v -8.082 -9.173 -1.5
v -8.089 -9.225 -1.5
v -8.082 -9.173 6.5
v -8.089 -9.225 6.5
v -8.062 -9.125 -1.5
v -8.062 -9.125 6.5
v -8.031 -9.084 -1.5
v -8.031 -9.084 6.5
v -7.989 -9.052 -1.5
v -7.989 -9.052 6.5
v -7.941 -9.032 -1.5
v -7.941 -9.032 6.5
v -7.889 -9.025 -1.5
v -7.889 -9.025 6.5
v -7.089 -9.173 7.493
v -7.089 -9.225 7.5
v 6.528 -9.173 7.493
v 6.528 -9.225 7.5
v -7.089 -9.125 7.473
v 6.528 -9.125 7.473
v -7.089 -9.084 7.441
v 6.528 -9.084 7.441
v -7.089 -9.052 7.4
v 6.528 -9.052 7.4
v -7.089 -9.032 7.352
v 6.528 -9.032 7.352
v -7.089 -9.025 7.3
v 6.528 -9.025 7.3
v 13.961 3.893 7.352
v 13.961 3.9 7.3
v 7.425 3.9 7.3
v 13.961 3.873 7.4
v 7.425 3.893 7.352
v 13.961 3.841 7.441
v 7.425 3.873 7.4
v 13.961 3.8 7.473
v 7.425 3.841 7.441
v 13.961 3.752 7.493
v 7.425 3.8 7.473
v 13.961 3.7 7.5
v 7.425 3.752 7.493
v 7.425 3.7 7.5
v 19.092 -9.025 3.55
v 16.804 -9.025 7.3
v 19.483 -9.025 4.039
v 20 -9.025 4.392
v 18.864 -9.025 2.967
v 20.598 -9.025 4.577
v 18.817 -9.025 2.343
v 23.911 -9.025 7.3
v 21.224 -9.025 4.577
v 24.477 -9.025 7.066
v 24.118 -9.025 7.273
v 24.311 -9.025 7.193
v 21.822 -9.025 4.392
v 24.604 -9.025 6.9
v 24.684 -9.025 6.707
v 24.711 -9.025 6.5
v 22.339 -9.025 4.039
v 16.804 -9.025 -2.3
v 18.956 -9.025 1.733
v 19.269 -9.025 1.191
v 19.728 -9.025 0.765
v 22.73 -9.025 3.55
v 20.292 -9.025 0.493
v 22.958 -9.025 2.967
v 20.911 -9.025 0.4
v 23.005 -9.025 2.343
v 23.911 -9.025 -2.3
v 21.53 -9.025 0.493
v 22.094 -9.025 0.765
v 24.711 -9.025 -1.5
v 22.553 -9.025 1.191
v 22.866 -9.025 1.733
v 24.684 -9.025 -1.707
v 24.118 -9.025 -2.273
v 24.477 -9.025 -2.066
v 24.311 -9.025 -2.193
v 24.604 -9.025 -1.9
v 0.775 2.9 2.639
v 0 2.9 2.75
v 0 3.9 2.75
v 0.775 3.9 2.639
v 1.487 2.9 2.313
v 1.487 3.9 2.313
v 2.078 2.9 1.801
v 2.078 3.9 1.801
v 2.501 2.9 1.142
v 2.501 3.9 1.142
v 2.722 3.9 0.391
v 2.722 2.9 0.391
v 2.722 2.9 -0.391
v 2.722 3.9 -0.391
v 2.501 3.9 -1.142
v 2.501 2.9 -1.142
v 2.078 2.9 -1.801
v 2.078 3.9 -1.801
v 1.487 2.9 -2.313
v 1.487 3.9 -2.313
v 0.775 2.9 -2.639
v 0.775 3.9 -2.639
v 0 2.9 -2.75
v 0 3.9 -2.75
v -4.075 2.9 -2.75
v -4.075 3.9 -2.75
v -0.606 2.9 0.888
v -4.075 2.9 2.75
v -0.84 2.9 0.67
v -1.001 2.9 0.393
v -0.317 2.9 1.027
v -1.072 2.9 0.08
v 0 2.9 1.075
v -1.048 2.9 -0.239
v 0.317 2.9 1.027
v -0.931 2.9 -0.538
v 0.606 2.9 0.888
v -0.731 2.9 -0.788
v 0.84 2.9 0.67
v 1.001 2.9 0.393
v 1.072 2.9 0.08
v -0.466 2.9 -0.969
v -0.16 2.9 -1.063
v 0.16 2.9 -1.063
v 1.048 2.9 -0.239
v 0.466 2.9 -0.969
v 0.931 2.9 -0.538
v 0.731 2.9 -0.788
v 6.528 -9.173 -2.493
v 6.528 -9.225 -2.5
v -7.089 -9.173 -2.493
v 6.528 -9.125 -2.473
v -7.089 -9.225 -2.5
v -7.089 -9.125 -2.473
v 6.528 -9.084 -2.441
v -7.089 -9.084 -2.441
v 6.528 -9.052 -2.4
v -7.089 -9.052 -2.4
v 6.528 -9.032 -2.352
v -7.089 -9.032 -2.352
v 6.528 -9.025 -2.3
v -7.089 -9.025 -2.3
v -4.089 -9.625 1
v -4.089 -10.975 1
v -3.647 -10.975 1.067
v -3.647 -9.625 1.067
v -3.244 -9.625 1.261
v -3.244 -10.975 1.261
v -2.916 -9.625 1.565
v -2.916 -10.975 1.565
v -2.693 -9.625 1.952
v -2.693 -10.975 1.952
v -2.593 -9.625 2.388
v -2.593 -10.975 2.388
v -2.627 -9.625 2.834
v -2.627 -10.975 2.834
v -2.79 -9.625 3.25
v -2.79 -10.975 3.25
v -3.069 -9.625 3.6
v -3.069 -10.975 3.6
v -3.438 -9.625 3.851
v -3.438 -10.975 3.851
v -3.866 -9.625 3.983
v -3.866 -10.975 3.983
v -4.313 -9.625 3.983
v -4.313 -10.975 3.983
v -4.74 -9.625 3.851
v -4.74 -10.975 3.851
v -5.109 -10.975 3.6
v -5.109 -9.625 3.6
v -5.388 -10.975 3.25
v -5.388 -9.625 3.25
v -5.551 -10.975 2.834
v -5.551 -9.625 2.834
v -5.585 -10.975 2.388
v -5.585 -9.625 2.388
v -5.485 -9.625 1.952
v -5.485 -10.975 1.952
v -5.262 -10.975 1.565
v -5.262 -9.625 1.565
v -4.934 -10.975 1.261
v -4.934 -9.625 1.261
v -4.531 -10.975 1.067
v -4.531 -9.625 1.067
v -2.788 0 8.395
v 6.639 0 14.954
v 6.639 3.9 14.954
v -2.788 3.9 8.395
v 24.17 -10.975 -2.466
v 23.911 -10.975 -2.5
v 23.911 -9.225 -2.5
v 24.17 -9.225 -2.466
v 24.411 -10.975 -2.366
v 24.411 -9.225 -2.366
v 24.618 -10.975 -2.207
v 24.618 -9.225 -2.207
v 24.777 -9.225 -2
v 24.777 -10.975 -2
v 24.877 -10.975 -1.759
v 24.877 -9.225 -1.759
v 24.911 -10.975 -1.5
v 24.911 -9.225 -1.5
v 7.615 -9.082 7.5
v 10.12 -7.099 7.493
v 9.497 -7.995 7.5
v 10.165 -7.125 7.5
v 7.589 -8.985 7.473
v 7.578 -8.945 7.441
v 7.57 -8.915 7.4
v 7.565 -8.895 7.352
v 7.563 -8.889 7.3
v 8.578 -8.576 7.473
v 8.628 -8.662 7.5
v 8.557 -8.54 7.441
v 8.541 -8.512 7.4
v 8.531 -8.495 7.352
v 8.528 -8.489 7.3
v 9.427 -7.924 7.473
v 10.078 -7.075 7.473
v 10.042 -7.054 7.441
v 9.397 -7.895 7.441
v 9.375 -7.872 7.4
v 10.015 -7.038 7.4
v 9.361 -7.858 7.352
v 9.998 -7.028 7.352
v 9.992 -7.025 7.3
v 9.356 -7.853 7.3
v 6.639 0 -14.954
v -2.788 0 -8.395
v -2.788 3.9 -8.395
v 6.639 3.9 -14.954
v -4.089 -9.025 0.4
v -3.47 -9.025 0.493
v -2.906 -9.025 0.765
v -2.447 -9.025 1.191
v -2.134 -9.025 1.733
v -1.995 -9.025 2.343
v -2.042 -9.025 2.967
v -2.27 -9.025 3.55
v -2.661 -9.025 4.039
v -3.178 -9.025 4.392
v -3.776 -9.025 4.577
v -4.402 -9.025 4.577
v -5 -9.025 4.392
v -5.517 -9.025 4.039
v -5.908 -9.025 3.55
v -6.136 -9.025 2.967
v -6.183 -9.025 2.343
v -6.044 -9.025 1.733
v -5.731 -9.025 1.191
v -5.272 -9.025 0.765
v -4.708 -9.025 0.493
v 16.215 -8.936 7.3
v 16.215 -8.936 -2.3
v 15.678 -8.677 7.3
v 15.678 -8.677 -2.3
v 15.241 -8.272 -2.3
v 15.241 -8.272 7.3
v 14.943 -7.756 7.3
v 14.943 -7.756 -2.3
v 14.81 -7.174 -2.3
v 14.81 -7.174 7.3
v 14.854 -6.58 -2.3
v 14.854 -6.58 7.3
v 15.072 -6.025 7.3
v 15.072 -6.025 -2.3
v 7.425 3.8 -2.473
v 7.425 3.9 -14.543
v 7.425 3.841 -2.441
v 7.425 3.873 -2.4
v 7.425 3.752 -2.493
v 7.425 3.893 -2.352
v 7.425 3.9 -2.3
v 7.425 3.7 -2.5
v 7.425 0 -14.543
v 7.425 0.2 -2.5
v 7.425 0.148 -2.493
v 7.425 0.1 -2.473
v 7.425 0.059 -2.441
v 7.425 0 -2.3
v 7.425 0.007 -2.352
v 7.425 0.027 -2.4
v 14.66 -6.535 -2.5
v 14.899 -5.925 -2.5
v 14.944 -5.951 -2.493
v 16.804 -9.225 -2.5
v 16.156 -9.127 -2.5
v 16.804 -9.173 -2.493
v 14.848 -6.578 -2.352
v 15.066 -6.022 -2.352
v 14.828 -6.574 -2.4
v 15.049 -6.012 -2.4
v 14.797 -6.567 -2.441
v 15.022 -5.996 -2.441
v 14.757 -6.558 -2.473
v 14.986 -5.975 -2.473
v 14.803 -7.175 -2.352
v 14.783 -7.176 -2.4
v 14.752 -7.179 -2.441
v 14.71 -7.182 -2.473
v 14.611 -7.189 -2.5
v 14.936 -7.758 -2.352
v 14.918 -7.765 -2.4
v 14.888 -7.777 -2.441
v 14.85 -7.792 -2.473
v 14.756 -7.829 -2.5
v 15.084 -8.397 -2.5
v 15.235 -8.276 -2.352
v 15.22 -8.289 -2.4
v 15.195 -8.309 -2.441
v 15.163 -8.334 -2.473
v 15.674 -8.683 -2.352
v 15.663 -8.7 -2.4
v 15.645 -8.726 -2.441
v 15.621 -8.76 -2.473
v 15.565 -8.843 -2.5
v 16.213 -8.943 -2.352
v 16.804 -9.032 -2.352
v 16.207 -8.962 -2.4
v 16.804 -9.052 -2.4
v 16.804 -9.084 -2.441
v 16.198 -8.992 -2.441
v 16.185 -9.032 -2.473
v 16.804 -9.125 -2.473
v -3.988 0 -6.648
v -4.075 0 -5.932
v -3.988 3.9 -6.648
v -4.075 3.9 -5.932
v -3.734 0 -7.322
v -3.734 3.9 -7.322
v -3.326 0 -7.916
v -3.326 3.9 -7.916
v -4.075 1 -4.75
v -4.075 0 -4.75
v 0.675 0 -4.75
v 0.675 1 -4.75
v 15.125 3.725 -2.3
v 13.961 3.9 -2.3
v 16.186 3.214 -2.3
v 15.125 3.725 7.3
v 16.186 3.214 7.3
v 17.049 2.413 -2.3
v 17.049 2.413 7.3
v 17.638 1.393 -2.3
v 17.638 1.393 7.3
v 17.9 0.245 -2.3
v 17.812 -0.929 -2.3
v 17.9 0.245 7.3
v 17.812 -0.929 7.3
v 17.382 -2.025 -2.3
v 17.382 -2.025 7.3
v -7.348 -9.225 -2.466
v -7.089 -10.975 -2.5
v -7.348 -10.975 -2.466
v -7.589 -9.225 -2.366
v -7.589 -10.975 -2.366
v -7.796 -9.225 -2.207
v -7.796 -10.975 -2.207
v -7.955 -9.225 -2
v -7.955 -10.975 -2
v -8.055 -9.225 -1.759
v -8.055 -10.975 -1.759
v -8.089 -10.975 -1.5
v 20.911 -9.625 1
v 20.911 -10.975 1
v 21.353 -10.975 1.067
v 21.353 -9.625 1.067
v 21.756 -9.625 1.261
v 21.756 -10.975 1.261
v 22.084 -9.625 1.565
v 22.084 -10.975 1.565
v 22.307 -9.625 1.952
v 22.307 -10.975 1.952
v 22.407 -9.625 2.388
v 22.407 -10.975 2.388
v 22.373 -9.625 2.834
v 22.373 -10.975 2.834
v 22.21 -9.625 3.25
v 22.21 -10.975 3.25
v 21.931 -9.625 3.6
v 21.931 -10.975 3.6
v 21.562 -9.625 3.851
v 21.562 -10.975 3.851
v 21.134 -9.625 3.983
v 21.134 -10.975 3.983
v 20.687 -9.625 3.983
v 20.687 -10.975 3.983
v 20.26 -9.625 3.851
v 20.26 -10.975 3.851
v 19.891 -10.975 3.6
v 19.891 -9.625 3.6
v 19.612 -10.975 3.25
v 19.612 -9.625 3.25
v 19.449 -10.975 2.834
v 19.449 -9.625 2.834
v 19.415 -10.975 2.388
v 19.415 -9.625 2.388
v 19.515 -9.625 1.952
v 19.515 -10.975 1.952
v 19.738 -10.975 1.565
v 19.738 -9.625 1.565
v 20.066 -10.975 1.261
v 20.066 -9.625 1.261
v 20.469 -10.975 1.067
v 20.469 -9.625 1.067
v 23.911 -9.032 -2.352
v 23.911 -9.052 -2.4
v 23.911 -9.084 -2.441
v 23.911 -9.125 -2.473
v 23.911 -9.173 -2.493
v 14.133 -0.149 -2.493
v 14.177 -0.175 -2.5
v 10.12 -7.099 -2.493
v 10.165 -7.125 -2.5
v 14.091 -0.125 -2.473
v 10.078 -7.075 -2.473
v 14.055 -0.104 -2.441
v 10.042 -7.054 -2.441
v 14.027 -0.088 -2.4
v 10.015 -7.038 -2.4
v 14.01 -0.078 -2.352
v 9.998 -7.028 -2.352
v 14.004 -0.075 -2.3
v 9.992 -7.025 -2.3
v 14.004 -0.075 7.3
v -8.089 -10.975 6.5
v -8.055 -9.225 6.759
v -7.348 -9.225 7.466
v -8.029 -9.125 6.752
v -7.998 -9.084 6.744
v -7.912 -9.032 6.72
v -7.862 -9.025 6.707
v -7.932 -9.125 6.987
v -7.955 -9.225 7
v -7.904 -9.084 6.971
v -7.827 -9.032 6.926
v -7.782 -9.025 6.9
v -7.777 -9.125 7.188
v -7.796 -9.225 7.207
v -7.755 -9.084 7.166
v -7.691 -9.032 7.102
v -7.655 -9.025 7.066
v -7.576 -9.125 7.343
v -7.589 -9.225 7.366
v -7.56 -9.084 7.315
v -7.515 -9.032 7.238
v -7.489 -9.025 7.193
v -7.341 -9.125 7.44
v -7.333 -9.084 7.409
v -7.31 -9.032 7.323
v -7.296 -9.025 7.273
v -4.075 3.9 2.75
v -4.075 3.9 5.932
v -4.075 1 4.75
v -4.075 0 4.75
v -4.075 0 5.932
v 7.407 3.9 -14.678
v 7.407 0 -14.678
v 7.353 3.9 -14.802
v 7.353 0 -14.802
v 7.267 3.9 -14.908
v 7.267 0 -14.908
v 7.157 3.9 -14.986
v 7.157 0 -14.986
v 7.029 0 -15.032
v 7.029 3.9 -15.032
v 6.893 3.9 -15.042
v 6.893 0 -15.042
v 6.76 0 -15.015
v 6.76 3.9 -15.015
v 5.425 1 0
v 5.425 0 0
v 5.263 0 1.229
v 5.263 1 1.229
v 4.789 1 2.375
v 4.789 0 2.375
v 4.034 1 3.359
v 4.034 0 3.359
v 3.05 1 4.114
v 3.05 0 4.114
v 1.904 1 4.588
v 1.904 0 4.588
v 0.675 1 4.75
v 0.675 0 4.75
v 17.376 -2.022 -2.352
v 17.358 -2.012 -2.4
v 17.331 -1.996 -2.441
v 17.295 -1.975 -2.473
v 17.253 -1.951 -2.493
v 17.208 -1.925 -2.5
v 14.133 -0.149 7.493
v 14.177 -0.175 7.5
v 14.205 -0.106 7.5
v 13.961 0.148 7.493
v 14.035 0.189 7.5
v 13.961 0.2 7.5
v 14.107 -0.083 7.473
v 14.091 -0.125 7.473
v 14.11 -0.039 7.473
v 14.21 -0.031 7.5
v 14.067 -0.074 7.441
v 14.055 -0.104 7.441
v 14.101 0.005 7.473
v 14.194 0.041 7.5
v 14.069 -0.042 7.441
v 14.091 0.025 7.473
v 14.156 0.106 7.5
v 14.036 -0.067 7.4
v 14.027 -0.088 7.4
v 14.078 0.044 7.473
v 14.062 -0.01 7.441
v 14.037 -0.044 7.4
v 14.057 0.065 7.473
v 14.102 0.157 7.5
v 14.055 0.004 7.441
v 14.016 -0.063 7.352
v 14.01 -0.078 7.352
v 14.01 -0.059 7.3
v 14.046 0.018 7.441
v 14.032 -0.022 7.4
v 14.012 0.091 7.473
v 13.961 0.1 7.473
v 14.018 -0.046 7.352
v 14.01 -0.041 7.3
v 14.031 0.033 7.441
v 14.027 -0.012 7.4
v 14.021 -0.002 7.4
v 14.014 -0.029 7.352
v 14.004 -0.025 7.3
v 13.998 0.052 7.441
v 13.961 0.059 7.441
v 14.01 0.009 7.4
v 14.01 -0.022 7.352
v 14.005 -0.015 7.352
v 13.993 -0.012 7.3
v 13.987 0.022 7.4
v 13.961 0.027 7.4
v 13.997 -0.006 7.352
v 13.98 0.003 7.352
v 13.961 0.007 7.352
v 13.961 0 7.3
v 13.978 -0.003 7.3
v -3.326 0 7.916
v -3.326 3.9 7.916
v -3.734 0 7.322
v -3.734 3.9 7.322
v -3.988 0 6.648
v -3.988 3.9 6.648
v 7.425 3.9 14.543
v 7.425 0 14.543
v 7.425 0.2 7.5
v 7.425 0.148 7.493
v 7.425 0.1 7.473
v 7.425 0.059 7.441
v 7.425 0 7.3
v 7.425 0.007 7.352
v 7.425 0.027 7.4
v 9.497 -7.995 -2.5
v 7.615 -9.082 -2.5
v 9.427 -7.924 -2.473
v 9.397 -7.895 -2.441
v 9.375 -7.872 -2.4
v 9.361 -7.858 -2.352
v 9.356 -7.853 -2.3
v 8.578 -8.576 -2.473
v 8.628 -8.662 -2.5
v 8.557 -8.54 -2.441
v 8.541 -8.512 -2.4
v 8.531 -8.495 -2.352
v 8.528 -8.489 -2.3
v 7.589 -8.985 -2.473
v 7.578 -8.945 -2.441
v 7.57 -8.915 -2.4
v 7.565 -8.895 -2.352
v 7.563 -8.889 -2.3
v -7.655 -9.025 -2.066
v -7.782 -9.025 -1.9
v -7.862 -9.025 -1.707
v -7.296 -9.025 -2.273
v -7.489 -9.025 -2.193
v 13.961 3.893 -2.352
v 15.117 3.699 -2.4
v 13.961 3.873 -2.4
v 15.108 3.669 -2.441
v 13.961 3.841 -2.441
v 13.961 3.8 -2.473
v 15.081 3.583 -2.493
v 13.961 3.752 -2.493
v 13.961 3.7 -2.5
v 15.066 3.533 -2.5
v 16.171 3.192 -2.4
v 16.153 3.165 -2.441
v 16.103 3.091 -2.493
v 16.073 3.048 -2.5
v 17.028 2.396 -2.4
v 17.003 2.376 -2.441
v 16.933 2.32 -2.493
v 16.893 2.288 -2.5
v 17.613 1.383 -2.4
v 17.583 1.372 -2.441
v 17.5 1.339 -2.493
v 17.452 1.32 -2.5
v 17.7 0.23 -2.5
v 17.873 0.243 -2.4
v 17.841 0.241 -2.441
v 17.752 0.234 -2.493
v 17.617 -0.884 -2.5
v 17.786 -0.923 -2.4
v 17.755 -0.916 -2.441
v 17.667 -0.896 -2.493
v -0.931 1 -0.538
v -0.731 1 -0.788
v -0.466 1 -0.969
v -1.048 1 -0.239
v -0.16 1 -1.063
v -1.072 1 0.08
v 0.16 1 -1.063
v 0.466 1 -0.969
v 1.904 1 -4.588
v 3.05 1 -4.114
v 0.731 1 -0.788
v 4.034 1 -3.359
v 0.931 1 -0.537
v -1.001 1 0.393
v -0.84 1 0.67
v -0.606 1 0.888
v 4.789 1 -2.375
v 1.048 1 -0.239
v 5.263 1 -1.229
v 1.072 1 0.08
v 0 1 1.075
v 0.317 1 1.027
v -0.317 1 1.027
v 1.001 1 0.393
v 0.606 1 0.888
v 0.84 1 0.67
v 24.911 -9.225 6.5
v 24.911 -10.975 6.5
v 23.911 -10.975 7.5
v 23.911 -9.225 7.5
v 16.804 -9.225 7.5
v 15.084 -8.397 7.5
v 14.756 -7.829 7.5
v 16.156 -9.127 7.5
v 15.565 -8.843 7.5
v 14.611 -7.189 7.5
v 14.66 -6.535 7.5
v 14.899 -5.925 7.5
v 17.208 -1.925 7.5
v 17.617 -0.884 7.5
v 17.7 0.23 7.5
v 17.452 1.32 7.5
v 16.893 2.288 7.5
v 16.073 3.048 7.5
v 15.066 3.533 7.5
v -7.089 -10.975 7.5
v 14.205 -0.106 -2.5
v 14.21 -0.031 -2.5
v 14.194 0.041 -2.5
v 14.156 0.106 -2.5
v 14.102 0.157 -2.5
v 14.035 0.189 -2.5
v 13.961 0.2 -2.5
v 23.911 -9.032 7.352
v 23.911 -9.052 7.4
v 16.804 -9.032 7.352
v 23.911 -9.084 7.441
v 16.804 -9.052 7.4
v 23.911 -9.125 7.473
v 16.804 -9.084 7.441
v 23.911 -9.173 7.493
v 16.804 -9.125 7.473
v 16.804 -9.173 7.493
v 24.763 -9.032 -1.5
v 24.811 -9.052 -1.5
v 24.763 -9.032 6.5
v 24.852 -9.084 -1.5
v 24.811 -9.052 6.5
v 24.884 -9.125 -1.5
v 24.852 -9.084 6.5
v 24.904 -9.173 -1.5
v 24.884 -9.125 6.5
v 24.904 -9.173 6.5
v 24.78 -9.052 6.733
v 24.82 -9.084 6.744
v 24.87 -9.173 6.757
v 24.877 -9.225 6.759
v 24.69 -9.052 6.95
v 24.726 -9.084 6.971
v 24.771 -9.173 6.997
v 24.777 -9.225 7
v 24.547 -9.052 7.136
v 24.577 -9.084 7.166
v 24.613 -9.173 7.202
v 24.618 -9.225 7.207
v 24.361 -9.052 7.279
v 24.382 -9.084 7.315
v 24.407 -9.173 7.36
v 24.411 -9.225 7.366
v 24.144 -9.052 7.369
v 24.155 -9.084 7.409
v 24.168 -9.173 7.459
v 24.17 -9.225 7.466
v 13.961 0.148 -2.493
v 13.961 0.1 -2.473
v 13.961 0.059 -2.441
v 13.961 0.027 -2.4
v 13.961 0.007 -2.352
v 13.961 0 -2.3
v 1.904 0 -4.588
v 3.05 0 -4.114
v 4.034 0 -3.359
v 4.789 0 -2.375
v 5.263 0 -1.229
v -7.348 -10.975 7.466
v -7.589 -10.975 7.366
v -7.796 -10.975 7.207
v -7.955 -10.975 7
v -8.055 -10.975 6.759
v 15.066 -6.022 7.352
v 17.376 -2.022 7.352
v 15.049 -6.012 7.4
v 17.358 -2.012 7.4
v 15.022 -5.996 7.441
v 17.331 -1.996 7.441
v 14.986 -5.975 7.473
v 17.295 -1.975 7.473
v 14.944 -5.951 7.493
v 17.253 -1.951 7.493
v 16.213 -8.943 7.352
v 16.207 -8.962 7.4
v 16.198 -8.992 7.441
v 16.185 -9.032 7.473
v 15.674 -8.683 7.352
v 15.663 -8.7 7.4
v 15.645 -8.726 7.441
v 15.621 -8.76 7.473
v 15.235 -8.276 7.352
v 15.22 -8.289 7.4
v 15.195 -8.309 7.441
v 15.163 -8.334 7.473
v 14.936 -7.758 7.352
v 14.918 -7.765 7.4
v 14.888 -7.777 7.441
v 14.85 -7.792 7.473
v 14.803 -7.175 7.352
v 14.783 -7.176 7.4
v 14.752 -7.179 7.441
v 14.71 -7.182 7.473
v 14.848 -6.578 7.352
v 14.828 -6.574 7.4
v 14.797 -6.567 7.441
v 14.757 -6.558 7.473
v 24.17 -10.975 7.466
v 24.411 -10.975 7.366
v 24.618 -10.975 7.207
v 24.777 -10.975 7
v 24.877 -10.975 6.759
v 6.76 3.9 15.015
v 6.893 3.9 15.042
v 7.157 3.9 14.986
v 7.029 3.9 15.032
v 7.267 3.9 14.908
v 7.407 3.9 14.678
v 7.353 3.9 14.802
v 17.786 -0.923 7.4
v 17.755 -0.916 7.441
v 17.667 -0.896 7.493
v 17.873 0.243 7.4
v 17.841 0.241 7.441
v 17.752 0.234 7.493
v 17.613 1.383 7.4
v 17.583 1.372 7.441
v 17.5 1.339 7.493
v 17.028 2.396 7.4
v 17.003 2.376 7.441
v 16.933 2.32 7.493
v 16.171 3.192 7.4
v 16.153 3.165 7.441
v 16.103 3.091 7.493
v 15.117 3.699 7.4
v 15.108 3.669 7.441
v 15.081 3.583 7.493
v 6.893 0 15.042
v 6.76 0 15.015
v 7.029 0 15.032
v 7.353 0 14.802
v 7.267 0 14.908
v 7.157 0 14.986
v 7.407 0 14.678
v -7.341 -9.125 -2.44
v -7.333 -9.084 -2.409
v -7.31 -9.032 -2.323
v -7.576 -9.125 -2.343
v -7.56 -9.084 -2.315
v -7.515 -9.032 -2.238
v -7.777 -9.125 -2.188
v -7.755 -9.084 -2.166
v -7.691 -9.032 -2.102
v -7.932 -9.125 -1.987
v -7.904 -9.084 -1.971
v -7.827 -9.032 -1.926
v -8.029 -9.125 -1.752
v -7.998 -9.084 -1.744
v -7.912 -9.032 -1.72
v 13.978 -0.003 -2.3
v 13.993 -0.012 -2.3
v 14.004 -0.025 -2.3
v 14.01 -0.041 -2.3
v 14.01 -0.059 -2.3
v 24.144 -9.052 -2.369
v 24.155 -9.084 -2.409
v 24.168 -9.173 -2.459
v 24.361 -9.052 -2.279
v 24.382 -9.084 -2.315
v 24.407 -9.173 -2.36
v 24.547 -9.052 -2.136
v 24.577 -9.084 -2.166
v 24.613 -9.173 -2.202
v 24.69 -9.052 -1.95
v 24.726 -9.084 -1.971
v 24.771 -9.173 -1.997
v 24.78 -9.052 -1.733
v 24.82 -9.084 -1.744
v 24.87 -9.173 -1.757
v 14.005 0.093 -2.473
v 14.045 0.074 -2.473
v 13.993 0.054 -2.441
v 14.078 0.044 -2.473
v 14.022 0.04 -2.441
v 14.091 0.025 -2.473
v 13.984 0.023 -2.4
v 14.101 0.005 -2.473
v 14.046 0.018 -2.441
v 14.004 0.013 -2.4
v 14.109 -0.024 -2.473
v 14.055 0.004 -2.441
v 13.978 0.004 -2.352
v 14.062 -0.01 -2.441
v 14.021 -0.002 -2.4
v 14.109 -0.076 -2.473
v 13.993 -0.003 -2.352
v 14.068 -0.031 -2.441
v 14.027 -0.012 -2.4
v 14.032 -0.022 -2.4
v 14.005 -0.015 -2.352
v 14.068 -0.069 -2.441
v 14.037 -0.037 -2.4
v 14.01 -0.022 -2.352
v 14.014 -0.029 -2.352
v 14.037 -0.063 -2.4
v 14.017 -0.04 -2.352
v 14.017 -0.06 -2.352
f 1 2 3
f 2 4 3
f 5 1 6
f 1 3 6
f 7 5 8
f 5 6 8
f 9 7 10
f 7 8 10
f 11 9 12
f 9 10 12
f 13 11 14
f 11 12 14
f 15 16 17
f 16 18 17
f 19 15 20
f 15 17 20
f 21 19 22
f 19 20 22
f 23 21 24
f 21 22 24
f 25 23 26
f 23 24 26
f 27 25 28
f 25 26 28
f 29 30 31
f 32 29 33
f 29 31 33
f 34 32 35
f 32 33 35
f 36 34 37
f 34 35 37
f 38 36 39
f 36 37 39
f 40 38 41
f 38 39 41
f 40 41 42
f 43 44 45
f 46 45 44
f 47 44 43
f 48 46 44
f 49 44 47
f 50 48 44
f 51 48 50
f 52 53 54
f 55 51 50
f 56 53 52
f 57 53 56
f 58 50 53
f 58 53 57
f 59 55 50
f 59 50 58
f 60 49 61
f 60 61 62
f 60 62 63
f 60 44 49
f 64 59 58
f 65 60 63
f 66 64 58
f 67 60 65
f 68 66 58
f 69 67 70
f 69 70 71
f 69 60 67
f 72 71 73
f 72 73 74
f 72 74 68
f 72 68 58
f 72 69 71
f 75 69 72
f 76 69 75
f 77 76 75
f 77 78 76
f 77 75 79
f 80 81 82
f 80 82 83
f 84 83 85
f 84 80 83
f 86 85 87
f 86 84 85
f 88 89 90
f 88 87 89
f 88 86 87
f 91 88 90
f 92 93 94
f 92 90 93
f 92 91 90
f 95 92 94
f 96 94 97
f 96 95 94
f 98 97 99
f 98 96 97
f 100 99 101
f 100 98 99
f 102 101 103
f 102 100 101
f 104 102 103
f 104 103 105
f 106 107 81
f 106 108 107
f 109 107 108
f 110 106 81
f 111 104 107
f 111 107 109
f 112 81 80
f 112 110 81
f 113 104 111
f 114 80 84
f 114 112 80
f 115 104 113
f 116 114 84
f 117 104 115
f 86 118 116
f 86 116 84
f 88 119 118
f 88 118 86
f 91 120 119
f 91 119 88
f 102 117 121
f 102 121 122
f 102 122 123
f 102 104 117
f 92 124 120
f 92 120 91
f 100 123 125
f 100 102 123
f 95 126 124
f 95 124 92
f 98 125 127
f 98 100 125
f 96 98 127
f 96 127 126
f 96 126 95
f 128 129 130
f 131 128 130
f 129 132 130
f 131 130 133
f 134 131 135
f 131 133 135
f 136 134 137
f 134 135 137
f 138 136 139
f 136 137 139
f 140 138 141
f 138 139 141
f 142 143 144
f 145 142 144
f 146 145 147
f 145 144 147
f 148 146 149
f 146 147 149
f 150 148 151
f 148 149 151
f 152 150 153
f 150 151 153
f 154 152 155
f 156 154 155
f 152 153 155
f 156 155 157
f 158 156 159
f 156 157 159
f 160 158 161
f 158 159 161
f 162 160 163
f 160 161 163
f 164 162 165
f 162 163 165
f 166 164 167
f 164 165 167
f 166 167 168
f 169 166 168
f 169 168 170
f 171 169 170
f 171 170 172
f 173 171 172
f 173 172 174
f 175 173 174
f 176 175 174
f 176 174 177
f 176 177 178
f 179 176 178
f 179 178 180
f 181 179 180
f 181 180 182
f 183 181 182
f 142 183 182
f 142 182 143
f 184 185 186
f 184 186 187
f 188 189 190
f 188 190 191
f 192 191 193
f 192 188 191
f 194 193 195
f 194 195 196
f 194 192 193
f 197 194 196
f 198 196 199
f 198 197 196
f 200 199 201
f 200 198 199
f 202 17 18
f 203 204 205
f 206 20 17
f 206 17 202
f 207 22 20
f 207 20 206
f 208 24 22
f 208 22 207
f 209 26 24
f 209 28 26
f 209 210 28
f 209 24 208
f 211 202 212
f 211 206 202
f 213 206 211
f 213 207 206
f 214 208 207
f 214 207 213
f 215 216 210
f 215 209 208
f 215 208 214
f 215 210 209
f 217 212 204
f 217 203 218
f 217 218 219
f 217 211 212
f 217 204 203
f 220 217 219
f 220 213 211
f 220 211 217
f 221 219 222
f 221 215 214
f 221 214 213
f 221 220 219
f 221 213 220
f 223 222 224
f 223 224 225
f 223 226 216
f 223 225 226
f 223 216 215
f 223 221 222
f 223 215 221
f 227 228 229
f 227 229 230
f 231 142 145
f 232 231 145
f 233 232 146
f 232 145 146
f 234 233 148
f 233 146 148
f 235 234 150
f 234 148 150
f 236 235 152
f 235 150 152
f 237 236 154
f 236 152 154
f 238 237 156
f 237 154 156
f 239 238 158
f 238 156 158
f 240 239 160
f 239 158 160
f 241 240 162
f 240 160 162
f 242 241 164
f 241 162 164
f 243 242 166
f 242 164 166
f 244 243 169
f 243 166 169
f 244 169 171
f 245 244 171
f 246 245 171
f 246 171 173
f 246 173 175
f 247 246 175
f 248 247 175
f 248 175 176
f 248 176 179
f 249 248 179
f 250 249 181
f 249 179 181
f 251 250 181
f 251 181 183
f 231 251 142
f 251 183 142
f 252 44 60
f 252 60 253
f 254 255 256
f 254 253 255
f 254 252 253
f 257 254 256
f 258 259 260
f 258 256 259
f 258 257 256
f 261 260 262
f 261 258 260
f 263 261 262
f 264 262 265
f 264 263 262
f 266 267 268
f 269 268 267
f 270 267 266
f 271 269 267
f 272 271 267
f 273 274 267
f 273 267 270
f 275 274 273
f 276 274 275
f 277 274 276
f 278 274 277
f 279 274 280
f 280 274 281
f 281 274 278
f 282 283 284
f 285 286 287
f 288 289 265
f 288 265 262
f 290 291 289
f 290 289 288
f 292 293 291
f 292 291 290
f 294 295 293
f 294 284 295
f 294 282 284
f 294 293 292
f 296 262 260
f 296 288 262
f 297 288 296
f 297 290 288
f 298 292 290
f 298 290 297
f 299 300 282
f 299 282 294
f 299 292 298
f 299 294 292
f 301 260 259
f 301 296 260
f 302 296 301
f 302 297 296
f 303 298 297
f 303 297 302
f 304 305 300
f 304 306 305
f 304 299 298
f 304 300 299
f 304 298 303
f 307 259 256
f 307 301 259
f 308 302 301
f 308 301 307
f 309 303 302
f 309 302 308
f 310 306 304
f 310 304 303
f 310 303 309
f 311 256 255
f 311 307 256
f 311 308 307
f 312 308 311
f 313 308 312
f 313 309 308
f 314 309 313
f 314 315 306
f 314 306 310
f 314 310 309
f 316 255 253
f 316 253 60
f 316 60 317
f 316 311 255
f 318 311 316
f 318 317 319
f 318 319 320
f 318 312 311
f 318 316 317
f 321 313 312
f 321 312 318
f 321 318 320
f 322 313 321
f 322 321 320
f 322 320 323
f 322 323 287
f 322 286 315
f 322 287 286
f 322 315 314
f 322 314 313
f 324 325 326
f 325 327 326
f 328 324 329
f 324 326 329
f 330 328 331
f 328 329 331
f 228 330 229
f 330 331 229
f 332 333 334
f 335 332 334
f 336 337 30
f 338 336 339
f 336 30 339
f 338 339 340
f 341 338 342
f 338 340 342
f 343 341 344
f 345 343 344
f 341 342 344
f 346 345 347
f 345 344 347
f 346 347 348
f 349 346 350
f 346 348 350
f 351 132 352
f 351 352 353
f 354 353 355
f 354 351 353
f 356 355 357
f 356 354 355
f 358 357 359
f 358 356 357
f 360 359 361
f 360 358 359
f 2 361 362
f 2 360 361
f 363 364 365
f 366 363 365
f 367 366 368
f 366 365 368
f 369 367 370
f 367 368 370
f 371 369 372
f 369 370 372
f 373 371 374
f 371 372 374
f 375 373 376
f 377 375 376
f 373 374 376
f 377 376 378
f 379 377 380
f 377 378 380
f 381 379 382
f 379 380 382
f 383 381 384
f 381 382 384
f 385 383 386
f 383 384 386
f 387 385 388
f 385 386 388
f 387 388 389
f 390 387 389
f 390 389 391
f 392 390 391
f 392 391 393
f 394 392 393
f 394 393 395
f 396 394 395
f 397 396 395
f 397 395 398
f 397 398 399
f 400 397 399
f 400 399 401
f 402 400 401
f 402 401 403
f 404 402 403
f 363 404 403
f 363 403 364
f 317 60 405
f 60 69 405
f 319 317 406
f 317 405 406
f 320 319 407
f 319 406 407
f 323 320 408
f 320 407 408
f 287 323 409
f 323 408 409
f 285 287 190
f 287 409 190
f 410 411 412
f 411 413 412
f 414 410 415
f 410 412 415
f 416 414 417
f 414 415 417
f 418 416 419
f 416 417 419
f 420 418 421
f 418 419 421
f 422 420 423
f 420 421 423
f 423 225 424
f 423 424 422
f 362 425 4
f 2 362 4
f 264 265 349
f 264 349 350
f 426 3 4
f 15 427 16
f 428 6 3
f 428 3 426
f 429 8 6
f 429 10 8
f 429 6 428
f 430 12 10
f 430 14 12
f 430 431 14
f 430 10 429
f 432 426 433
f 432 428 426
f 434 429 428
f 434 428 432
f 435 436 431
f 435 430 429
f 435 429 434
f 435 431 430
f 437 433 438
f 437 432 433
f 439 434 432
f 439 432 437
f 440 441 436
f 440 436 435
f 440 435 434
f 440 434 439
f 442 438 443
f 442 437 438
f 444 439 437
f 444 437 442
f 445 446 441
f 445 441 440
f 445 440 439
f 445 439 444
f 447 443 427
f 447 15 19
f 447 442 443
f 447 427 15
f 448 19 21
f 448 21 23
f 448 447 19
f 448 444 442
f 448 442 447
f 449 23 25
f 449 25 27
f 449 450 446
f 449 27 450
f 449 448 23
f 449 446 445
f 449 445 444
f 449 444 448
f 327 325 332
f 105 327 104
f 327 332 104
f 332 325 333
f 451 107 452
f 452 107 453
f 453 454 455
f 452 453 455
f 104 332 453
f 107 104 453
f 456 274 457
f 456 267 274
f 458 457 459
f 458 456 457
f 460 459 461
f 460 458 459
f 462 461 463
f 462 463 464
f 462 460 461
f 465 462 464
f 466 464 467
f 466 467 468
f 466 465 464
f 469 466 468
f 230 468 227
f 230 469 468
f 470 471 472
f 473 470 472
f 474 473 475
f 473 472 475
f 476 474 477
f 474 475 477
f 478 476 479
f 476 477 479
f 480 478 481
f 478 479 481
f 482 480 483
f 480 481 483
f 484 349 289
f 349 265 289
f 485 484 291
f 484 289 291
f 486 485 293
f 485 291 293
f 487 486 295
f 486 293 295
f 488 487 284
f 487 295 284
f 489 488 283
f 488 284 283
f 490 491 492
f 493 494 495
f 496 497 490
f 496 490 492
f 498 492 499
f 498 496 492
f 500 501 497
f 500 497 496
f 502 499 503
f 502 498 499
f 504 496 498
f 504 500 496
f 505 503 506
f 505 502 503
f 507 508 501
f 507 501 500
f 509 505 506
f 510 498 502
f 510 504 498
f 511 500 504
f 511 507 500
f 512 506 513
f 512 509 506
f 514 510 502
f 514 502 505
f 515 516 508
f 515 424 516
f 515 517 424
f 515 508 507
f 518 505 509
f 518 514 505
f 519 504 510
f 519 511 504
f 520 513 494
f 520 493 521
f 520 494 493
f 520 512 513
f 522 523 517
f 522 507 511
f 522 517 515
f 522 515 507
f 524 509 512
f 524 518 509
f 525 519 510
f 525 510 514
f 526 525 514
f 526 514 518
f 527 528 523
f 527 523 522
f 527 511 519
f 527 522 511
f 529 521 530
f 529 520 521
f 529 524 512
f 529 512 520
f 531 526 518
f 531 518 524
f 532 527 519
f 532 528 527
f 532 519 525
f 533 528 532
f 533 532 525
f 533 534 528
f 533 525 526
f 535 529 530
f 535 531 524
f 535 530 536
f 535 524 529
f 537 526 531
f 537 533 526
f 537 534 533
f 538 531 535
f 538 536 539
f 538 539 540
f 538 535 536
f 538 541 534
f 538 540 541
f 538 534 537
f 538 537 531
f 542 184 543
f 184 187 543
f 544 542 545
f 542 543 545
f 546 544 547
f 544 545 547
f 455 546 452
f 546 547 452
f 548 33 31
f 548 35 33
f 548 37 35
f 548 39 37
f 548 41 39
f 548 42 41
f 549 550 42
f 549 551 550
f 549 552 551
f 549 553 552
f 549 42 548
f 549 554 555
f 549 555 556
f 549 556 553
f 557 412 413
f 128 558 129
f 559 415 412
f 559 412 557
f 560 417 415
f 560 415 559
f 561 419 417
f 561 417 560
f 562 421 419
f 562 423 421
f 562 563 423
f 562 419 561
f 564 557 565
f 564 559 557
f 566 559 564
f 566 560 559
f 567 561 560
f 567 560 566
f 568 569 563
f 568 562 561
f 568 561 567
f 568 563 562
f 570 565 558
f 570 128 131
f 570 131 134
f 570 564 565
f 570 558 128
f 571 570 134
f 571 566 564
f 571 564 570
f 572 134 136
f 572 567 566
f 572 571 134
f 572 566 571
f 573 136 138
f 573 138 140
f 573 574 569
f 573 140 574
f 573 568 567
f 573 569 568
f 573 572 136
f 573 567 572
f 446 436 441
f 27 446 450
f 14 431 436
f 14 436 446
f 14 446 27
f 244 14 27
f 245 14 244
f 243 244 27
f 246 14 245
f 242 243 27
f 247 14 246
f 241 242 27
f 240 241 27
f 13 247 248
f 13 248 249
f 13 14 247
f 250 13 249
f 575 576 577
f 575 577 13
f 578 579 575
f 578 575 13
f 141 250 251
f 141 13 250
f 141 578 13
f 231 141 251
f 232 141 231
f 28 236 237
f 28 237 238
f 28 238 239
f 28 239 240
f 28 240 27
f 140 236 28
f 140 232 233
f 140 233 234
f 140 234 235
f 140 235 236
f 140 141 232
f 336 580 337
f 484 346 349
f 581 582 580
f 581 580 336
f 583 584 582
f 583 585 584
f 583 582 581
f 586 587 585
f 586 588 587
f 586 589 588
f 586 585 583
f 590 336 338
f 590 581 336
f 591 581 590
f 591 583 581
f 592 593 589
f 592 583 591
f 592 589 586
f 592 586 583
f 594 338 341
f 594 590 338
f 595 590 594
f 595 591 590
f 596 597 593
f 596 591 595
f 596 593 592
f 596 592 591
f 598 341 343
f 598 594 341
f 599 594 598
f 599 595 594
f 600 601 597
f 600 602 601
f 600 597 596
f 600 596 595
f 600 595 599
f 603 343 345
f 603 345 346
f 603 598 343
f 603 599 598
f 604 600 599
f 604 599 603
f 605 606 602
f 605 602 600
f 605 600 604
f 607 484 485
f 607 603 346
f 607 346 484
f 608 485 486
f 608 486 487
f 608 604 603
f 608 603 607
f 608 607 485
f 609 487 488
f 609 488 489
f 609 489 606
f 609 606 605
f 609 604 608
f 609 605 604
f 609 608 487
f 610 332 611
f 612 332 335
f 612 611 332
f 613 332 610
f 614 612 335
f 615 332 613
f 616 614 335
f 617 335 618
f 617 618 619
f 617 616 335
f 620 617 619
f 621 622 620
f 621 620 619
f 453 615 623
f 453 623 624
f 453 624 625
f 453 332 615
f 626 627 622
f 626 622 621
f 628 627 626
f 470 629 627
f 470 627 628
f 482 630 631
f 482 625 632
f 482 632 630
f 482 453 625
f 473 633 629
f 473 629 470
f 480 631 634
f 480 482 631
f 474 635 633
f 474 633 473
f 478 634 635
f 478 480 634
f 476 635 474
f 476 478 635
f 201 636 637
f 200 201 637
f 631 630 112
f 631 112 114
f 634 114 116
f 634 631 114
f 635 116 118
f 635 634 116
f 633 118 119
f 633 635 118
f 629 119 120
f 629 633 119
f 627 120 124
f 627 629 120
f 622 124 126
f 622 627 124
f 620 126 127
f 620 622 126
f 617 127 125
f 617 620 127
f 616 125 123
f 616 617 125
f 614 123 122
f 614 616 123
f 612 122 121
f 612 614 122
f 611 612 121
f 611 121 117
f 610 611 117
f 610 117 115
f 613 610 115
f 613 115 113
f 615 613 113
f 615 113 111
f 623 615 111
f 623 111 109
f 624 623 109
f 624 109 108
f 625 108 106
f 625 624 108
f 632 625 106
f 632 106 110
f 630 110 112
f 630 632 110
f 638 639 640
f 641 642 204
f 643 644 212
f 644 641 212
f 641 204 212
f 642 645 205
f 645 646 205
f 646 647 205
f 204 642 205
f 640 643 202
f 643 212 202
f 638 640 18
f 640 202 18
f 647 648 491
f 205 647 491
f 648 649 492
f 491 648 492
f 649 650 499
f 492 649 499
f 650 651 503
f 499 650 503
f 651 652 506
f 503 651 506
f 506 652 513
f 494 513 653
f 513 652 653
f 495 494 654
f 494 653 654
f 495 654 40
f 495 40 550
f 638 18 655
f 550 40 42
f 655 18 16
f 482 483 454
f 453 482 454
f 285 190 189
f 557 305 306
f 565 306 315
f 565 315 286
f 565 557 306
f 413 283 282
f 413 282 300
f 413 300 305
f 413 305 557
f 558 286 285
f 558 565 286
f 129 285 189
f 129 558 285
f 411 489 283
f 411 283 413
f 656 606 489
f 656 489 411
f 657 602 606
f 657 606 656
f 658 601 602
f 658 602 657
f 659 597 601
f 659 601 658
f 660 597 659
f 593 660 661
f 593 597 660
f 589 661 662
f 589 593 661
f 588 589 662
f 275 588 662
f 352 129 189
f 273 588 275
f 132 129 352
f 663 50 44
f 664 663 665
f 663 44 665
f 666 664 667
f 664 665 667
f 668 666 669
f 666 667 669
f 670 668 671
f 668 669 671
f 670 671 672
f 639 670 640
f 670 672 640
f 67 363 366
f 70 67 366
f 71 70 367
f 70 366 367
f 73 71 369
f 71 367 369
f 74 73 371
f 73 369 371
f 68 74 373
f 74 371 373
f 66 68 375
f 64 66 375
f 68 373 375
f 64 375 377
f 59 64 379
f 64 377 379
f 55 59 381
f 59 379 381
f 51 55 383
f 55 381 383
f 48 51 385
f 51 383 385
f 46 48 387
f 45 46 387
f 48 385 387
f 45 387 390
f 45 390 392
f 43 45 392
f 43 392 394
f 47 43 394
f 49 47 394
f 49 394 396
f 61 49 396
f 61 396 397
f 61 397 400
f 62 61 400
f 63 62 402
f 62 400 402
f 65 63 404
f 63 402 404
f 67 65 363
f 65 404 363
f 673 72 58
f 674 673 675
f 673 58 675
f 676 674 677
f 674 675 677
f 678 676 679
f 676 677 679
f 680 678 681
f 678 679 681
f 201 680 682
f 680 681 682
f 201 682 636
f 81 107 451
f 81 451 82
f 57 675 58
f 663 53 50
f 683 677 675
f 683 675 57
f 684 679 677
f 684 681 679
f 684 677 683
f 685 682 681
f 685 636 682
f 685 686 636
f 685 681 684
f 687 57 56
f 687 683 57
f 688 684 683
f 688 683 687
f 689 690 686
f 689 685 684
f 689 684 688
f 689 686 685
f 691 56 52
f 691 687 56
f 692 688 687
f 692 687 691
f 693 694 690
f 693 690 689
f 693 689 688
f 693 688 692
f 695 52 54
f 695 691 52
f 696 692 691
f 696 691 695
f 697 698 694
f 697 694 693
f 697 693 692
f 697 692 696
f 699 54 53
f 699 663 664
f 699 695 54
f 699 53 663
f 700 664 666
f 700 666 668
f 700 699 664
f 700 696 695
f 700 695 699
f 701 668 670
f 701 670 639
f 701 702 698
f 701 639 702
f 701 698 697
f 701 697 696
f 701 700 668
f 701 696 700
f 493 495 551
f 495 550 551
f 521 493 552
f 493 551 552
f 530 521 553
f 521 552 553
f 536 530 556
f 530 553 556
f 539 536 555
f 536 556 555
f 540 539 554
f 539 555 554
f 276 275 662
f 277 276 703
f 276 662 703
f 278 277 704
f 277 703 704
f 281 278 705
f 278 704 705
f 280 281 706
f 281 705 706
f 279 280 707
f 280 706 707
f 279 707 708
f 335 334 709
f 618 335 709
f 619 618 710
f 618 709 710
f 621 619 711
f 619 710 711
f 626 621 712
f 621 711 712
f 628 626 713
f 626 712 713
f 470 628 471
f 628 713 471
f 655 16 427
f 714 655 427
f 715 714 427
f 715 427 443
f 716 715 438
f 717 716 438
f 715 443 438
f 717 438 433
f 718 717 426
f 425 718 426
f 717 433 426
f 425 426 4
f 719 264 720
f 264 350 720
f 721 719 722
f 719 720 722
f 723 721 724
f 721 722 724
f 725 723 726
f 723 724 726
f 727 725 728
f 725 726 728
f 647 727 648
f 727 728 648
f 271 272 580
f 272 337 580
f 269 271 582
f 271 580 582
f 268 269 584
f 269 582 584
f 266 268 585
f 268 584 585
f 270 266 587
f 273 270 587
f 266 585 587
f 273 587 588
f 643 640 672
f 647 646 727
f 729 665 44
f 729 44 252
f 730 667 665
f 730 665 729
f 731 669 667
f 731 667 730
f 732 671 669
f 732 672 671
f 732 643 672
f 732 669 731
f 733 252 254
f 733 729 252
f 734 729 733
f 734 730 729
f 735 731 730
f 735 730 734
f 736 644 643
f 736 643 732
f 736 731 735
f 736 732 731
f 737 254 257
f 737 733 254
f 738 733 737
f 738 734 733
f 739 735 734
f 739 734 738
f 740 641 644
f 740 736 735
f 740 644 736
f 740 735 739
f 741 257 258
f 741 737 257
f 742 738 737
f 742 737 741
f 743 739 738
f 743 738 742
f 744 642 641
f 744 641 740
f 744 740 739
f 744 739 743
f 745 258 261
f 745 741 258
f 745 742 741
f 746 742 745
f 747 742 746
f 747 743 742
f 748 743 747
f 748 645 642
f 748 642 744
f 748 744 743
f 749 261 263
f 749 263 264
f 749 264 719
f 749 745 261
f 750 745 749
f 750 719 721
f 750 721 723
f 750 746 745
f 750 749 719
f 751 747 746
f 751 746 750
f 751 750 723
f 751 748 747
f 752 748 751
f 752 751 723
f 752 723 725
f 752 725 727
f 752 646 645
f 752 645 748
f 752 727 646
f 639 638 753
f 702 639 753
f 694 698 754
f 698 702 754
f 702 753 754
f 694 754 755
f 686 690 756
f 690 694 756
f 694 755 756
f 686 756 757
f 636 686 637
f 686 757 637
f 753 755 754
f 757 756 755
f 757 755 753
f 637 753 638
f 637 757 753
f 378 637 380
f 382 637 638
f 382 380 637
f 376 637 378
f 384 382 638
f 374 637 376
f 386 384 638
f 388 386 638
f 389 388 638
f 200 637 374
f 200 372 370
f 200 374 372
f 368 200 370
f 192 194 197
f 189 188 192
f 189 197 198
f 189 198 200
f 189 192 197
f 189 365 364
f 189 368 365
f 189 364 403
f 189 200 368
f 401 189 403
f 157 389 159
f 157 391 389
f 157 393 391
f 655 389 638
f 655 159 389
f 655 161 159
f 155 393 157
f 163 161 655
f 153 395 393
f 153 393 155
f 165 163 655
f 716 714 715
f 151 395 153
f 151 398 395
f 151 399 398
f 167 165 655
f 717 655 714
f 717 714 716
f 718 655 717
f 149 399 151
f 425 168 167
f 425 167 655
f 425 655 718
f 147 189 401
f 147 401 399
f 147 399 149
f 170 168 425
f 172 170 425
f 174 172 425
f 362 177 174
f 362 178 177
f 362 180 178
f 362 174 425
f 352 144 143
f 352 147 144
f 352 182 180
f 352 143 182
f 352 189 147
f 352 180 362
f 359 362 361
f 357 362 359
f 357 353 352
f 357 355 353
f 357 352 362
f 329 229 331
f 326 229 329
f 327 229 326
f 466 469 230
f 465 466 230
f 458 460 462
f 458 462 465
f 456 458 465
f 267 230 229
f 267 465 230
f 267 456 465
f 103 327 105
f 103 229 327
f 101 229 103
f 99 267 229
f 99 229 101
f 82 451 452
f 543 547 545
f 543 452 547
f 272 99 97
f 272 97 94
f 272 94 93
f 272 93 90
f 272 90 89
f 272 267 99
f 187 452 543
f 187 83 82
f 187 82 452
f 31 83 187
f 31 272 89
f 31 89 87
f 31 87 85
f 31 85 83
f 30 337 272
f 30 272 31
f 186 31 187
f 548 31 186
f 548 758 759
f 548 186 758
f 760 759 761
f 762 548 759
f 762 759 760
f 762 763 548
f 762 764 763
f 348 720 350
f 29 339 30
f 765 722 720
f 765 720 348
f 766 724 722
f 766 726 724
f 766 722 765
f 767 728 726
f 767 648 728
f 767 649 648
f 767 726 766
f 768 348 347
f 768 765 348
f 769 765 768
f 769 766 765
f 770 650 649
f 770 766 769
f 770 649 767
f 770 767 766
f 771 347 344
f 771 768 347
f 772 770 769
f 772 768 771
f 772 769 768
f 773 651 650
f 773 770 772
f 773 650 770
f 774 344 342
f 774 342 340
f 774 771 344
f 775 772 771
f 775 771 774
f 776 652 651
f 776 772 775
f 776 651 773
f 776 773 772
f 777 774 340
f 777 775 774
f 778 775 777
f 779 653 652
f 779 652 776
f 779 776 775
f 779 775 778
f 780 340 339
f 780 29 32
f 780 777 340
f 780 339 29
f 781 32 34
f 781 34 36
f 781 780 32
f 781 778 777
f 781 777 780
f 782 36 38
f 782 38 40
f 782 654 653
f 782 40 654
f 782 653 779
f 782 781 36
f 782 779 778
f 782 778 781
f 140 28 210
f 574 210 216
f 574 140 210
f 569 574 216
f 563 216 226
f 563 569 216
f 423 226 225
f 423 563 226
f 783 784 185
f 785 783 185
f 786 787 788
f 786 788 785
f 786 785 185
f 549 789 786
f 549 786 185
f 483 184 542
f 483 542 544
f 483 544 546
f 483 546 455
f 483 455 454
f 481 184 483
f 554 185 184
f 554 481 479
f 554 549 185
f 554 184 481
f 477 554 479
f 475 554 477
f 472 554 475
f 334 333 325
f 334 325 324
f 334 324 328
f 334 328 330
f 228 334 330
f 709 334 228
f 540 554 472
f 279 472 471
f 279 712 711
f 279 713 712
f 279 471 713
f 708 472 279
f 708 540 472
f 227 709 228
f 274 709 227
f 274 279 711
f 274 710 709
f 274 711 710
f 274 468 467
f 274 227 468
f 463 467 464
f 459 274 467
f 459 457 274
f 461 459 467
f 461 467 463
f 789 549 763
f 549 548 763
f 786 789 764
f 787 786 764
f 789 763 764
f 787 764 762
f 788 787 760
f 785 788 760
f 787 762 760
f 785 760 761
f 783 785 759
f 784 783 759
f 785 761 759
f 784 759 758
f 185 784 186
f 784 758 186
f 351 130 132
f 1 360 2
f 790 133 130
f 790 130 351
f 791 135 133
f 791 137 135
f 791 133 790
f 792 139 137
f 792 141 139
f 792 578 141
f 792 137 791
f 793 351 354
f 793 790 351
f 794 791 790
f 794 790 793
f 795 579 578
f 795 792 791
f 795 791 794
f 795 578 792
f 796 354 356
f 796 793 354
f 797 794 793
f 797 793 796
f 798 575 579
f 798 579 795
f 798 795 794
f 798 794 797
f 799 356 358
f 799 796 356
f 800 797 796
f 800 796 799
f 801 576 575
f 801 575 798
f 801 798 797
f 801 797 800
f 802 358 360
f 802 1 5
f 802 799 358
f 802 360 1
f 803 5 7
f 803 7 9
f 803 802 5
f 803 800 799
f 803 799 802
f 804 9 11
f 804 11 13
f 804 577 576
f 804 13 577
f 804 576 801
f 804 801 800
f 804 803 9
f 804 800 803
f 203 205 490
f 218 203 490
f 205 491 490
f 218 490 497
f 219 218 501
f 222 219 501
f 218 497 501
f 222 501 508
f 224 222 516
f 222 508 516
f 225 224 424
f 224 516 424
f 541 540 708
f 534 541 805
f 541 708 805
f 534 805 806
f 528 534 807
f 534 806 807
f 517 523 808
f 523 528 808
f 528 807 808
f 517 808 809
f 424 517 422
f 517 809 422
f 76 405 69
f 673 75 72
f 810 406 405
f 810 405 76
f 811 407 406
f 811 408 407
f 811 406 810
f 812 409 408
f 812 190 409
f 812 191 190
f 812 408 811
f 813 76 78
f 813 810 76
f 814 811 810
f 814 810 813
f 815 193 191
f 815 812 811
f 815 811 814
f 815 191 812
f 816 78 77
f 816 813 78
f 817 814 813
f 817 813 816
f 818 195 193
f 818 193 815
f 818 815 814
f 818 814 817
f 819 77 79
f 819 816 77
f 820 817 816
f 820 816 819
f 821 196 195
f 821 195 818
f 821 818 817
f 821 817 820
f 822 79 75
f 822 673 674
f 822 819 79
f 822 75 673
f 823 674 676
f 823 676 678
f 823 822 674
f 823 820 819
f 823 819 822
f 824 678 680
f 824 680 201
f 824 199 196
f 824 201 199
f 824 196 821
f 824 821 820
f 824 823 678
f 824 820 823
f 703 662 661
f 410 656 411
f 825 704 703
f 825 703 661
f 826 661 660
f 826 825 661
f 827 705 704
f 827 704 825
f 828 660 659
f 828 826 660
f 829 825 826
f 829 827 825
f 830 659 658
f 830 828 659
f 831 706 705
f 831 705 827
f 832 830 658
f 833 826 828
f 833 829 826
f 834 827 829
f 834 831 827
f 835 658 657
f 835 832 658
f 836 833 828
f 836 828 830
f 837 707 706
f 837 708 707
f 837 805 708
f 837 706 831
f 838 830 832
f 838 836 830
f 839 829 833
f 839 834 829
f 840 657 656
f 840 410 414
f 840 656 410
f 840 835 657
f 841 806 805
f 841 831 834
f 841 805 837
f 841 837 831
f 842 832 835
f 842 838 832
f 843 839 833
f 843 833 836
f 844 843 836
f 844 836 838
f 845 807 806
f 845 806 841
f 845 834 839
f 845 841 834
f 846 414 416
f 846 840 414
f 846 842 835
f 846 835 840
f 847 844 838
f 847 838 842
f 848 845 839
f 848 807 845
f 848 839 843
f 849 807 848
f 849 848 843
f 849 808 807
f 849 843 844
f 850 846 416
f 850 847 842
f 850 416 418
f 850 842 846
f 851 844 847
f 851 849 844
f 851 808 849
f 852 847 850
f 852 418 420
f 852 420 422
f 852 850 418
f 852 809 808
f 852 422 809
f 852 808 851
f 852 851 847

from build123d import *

# Parameters (mm, degrees)
SKETCH1_R           = 1.075
BOSS_EXTRUDE1_DEPTH = 3.9
CUT_EXTRUDE1_DEPTH  = 1
CUT_EXTRUDE2_START  = -1
SKETCH4_R           = 2.75
SKETCH4_R_2         = 1.075
CUT_EXTRUDE2_DEPTH  = 1
SKETCH6_W           = 10
SKETCH6_H           = 3.9
BOSS_EXTRUDE2_DEPTH = 5
SKETCH7_W           = 10
SKETCH7_H           = 3.9
BOSS_EXTRUDE3_DEPTH = 10
SKETCH10_R          = 1.5
CUT_EXTRUDE3_DEPTH  = 10
FILLET2_R           = 3
FILLET3_R           = 1
FILLET4_R           = 2
FILLET5_R           = 4
CHAMFER1_SIZE       = 0.6
FILLET6_R           = 0.5
FILLET7_R           = 0.2


with BuildPart() as part:
    # Sketch1 → Boss-Extrude1 (new body)
    with BuildSketch(Plane(origin=(0, 0, 0), x_dir=(1, 0, 0), z_dir=(0, 1, 0))):
        Polygon((-4.075, 0), (-4.075, 7.5), (7.425, 15.5), (7.425, -15.5), (-4.075, -7.5), align=None)
        with Locations(Location((0, 0, 0), (0, 0, 270))):
            Circle(SKETCH1_R, mode=Mode.SUBTRACT)
    extrude(amount=BOSS_EXTRUDE1_DEPTH)

    # Sketch2 → Cut-Extrude1 (cut)
    with BuildSketch(Plane.XZ):
        with BuildLine():
            ThreePointArc((-4.075, 0), (-2.683757211, 3.358757211), (0.675, 4.75))
            Line((0.675, 4.75), (-4.075, 4.75))
            Line((-4.075, 4.75), (-4.075, 0))
        make_face()
        with BuildLine():
            Line((-4.075, -4.75), (0.675, -4.75))
            ThreePointArc((0.675, -4.75), (-2.683757211, -3.358757211), (-4.075, 0))
            Line((-4.075, 0), (-4.075, -4.75))
        make_face()
        with BuildLine():
            ThreePointArc((-1.075, 0), (0, 1.075), (1.075, 0))
            Line((1.075, 0), (5.425, 0))
            ThreePointArc((5.425, 0), (4.033757211, 3.358757211), (0.675, 4.75))
            ThreePointArc((0.675, 4.75), (-2.683757211, 3.358757211), (-4.075, 0))
            Line((-4.075, 0), (-1.075, 0))
        make_face()
        with BuildLine():
            Line((5.425, 0), (1.075, 0))
            ThreePointArc((1.075, 0), (0, -1.075), (-1.075, 0))
            Line((-1.075, 0), (-4.075, 0))
            ThreePointArc((-4.075, 0), (-2.683757211, -3.358757211), (0.675, -4.75))
            ThreePointArc((0.675, -4.75), (4.033757211, -3.358757211), (5.425, 0))
        make_face()
    extrude(amount=-CUT_EXTRUDE1_DEPTH, mode=Mode.SUBTRACT)

    # Sketch4 → Cut-Extrude2 (cut)
    # profile 1 of 2: a face of its own
    with BuildSketch(Plane(origin=(0, 3.9, 0), x_dir=(1, 0, 0), z_dir=(0, 1, 0)).offset(CUT_EXTRUDE2_START)):
        with BuildLine():
            ThreePointArc((0, -2.75), (-2.75, 0), (0, 2.75))
            Line((0, 2.75), (-4.075, 2.75))
            Line((-4.075, 2.75), (-4.075, -2.75))
            Line((-4.075, -2.75), (0, -2.75))
        make_face()
    # profile 2 of 2: a face of its own
    with BuildSketch(Plane(origin=(0, 3.9, 0), x_dir=(1, 0, 0), z_dir=(0, 1, 0)).offset(CUT_EXTRUDE2_START)):
        Circle(SKETCH4_R)
        with Locations(Location((0, 0, 0), (0, 0, 90))):
            Circle(SKETCH4_R_2, mode=Mode.SUBTRACT)
    extrude(amount=CUT_EXTRUDE2_DEPTH, mode=Mode.SUBTRACT)

    # Sketch6 → Boss-Extrude2 (add)
    with BuildSketch(Plane(origin=(7.425, 0, 0), x_dir=(0, 0, -1), z_dir=(1, 0, 0))):
        with Locations((-2.5, 1.95)):
            Rectangle(SKETCH6_W, SKETCH6_H)
    extrude(amount=BOSS_EXTRUDE2_DEPTH)

    # Sweep1: sweep along a path in Sketch8
    with BuildLine(Plane.XY) as sweep1_path:
        Line((12.425, 1.95), (13.960898385, 1.95))
        ThreePointArc((13.960898385, 1.95), (15.692949192, 0.95), (15.692949192, -1.05))
        Line((15.692949192, -1.05), (10.525664283, -10))
    # Sketch7 → Sweep1 (sweep)
    with BuildSketch(Plane(origin=(12.425, 0, 0), x_dir=(0, 0, -1), z_dir=(1, 0, 0))):
        with Locations((-2.5, 1.95)):
            Rectangle(SKETCH7_W, SKETCH7_H)
    sweep(path=sweep1_path.line)

    # Sketch9 → Boss-Extrude3 (add)
    with BuildSketch(Plane(origin=(0, 0, -2.5), x_dir=(-1, 0, 0), z_dir=(0, 0, -1))):
        Polygon((-12.214413821, -10.975), (8.089101615, -10.975), (8.089101615, -9.025), (-24.910898385, -9.025), (-24.910898385, -10.975), align=None)
    extrude(amount=-BOSS_EXTRUDE3_DEPTH)

    # Sketch10 → Cut-Extrude3 (cut)
    with BuildSketch(Plane.XZ.offset(10.975)):
        with Locations(Location((-4.089101615, 2.5, 0), (0, 0, 270))):
            Circle(SKETCH10_R)
        with Locations(Location((20.910898385, 2.5, 0), (0, 0, 270))):
            Circle(SKETCH10_R)
    extrude(amount=-CUT_EXTRUDE3_DEPTH, mode=Mode.SUBTRACT)

    # Fillet2
    fillet2_edges = [part.edges().sort_by_distance(p)[0] for p in [
        (-4.075, 1.95, -7.5),
        (-4.075, 1.95, 7.5),
    ]]
    fillet(fillet2_edges, radius=FILLET2_R)

    # Fillet3
    fillet3_edges = [part.edges().sort_by_distance(p)[0] for p in [
        (-8.089101615, -10, -2.5),
        (24.910898385, -10, 7.5),
        (-8.089101615, -10, 7.5),
        (24.910898385, -10, -2.5),
    ]]
    fillet(fillet3_edges, radius=FILLET3_R)

    # Fillet4
    fillet4_edges = [part.edges().sort_by_distance(p)[0] for p in [
        (13.340246845, -9.025, 2.5),
    ]]
    fillet(fillet4_edges, radius=FILLET4_R)

    # Fillet5
    fillet5_edges = [part.edges().sort_by_distance(p)[0] for p in [
        (8.836914746, -9.025, 2.5),
    ]]
    fillet(fillet5_edges, radius=FILLET5_R)

    # Chamfer1
    chamfer1_edges = [part.edges().sort_by_distance(p)[0] for p in [
        (-4.089101615, -9.025, 4),
        (20.910898385, -9.025, 4),
    ]]
    chamfer(chamfer1_edges, length=CHAMFER1_SIZE)

    # Fillet6
    fillet6_edges = [part.edges().sort_by_distance(p)[0] for p in [
        (7.425, 1.95, -15.5),
        (7.425, 1.95, 15.5),
    ]]
    fillet(fillet6_edges, radius=FILLET6_R)

    # Fillet7
    fillet7_edges = [part.edges().sort_by_distance(p)[0] for p in [
        (24.910898385, -9.025, 2.5),
        (-0.280793973, -9.025, 7.5),
        (24.618005166, -9.025, -2.207106781),
        (24.618005166, -9.025, 7.207106781),
        (-0.280793973, -9.025, -2.5),
        (-8.089101615, -9.025, 2.5),
        (-7.796208396, -9.025, 7.207106781),
        (-7.796208396, -9.025, -2.207106781),
        (20.357623423, -9.025, 7.5),
        (20.357623423, -9.025, -2.5),
        (15.072297653, -8.025, 7.5),
        (15.072297653, -8.025, -2.5),
        (8.527513669, -8.489101615, -2.5),
        (8.527513669, -8.489101615, 7.5),
        (10.692949192, 3.9, 7.5),
        (10.692949192, 0, 7.5),
        (10.692949192, 0, -2.5),
        (10.692949192, 3.9, -2.5),
        (17.38169873, 1.925, 7.5),
        (14.004199655, -0.025, 7.5),
        (14.004199655, -0.025, -2.5),
        (17.38169873, 1.925, -2.5),
        (16.226998191, -4.025, 7.5),
        (11.99790747, -3.55, 7.5),
        (11.99790747, -3.55, -2.5),
        (16.226998191, -4.025, -2.5),
    ]]
    fillet(fillet7_edges, radius=FILLET7_R)


solid = part.part
